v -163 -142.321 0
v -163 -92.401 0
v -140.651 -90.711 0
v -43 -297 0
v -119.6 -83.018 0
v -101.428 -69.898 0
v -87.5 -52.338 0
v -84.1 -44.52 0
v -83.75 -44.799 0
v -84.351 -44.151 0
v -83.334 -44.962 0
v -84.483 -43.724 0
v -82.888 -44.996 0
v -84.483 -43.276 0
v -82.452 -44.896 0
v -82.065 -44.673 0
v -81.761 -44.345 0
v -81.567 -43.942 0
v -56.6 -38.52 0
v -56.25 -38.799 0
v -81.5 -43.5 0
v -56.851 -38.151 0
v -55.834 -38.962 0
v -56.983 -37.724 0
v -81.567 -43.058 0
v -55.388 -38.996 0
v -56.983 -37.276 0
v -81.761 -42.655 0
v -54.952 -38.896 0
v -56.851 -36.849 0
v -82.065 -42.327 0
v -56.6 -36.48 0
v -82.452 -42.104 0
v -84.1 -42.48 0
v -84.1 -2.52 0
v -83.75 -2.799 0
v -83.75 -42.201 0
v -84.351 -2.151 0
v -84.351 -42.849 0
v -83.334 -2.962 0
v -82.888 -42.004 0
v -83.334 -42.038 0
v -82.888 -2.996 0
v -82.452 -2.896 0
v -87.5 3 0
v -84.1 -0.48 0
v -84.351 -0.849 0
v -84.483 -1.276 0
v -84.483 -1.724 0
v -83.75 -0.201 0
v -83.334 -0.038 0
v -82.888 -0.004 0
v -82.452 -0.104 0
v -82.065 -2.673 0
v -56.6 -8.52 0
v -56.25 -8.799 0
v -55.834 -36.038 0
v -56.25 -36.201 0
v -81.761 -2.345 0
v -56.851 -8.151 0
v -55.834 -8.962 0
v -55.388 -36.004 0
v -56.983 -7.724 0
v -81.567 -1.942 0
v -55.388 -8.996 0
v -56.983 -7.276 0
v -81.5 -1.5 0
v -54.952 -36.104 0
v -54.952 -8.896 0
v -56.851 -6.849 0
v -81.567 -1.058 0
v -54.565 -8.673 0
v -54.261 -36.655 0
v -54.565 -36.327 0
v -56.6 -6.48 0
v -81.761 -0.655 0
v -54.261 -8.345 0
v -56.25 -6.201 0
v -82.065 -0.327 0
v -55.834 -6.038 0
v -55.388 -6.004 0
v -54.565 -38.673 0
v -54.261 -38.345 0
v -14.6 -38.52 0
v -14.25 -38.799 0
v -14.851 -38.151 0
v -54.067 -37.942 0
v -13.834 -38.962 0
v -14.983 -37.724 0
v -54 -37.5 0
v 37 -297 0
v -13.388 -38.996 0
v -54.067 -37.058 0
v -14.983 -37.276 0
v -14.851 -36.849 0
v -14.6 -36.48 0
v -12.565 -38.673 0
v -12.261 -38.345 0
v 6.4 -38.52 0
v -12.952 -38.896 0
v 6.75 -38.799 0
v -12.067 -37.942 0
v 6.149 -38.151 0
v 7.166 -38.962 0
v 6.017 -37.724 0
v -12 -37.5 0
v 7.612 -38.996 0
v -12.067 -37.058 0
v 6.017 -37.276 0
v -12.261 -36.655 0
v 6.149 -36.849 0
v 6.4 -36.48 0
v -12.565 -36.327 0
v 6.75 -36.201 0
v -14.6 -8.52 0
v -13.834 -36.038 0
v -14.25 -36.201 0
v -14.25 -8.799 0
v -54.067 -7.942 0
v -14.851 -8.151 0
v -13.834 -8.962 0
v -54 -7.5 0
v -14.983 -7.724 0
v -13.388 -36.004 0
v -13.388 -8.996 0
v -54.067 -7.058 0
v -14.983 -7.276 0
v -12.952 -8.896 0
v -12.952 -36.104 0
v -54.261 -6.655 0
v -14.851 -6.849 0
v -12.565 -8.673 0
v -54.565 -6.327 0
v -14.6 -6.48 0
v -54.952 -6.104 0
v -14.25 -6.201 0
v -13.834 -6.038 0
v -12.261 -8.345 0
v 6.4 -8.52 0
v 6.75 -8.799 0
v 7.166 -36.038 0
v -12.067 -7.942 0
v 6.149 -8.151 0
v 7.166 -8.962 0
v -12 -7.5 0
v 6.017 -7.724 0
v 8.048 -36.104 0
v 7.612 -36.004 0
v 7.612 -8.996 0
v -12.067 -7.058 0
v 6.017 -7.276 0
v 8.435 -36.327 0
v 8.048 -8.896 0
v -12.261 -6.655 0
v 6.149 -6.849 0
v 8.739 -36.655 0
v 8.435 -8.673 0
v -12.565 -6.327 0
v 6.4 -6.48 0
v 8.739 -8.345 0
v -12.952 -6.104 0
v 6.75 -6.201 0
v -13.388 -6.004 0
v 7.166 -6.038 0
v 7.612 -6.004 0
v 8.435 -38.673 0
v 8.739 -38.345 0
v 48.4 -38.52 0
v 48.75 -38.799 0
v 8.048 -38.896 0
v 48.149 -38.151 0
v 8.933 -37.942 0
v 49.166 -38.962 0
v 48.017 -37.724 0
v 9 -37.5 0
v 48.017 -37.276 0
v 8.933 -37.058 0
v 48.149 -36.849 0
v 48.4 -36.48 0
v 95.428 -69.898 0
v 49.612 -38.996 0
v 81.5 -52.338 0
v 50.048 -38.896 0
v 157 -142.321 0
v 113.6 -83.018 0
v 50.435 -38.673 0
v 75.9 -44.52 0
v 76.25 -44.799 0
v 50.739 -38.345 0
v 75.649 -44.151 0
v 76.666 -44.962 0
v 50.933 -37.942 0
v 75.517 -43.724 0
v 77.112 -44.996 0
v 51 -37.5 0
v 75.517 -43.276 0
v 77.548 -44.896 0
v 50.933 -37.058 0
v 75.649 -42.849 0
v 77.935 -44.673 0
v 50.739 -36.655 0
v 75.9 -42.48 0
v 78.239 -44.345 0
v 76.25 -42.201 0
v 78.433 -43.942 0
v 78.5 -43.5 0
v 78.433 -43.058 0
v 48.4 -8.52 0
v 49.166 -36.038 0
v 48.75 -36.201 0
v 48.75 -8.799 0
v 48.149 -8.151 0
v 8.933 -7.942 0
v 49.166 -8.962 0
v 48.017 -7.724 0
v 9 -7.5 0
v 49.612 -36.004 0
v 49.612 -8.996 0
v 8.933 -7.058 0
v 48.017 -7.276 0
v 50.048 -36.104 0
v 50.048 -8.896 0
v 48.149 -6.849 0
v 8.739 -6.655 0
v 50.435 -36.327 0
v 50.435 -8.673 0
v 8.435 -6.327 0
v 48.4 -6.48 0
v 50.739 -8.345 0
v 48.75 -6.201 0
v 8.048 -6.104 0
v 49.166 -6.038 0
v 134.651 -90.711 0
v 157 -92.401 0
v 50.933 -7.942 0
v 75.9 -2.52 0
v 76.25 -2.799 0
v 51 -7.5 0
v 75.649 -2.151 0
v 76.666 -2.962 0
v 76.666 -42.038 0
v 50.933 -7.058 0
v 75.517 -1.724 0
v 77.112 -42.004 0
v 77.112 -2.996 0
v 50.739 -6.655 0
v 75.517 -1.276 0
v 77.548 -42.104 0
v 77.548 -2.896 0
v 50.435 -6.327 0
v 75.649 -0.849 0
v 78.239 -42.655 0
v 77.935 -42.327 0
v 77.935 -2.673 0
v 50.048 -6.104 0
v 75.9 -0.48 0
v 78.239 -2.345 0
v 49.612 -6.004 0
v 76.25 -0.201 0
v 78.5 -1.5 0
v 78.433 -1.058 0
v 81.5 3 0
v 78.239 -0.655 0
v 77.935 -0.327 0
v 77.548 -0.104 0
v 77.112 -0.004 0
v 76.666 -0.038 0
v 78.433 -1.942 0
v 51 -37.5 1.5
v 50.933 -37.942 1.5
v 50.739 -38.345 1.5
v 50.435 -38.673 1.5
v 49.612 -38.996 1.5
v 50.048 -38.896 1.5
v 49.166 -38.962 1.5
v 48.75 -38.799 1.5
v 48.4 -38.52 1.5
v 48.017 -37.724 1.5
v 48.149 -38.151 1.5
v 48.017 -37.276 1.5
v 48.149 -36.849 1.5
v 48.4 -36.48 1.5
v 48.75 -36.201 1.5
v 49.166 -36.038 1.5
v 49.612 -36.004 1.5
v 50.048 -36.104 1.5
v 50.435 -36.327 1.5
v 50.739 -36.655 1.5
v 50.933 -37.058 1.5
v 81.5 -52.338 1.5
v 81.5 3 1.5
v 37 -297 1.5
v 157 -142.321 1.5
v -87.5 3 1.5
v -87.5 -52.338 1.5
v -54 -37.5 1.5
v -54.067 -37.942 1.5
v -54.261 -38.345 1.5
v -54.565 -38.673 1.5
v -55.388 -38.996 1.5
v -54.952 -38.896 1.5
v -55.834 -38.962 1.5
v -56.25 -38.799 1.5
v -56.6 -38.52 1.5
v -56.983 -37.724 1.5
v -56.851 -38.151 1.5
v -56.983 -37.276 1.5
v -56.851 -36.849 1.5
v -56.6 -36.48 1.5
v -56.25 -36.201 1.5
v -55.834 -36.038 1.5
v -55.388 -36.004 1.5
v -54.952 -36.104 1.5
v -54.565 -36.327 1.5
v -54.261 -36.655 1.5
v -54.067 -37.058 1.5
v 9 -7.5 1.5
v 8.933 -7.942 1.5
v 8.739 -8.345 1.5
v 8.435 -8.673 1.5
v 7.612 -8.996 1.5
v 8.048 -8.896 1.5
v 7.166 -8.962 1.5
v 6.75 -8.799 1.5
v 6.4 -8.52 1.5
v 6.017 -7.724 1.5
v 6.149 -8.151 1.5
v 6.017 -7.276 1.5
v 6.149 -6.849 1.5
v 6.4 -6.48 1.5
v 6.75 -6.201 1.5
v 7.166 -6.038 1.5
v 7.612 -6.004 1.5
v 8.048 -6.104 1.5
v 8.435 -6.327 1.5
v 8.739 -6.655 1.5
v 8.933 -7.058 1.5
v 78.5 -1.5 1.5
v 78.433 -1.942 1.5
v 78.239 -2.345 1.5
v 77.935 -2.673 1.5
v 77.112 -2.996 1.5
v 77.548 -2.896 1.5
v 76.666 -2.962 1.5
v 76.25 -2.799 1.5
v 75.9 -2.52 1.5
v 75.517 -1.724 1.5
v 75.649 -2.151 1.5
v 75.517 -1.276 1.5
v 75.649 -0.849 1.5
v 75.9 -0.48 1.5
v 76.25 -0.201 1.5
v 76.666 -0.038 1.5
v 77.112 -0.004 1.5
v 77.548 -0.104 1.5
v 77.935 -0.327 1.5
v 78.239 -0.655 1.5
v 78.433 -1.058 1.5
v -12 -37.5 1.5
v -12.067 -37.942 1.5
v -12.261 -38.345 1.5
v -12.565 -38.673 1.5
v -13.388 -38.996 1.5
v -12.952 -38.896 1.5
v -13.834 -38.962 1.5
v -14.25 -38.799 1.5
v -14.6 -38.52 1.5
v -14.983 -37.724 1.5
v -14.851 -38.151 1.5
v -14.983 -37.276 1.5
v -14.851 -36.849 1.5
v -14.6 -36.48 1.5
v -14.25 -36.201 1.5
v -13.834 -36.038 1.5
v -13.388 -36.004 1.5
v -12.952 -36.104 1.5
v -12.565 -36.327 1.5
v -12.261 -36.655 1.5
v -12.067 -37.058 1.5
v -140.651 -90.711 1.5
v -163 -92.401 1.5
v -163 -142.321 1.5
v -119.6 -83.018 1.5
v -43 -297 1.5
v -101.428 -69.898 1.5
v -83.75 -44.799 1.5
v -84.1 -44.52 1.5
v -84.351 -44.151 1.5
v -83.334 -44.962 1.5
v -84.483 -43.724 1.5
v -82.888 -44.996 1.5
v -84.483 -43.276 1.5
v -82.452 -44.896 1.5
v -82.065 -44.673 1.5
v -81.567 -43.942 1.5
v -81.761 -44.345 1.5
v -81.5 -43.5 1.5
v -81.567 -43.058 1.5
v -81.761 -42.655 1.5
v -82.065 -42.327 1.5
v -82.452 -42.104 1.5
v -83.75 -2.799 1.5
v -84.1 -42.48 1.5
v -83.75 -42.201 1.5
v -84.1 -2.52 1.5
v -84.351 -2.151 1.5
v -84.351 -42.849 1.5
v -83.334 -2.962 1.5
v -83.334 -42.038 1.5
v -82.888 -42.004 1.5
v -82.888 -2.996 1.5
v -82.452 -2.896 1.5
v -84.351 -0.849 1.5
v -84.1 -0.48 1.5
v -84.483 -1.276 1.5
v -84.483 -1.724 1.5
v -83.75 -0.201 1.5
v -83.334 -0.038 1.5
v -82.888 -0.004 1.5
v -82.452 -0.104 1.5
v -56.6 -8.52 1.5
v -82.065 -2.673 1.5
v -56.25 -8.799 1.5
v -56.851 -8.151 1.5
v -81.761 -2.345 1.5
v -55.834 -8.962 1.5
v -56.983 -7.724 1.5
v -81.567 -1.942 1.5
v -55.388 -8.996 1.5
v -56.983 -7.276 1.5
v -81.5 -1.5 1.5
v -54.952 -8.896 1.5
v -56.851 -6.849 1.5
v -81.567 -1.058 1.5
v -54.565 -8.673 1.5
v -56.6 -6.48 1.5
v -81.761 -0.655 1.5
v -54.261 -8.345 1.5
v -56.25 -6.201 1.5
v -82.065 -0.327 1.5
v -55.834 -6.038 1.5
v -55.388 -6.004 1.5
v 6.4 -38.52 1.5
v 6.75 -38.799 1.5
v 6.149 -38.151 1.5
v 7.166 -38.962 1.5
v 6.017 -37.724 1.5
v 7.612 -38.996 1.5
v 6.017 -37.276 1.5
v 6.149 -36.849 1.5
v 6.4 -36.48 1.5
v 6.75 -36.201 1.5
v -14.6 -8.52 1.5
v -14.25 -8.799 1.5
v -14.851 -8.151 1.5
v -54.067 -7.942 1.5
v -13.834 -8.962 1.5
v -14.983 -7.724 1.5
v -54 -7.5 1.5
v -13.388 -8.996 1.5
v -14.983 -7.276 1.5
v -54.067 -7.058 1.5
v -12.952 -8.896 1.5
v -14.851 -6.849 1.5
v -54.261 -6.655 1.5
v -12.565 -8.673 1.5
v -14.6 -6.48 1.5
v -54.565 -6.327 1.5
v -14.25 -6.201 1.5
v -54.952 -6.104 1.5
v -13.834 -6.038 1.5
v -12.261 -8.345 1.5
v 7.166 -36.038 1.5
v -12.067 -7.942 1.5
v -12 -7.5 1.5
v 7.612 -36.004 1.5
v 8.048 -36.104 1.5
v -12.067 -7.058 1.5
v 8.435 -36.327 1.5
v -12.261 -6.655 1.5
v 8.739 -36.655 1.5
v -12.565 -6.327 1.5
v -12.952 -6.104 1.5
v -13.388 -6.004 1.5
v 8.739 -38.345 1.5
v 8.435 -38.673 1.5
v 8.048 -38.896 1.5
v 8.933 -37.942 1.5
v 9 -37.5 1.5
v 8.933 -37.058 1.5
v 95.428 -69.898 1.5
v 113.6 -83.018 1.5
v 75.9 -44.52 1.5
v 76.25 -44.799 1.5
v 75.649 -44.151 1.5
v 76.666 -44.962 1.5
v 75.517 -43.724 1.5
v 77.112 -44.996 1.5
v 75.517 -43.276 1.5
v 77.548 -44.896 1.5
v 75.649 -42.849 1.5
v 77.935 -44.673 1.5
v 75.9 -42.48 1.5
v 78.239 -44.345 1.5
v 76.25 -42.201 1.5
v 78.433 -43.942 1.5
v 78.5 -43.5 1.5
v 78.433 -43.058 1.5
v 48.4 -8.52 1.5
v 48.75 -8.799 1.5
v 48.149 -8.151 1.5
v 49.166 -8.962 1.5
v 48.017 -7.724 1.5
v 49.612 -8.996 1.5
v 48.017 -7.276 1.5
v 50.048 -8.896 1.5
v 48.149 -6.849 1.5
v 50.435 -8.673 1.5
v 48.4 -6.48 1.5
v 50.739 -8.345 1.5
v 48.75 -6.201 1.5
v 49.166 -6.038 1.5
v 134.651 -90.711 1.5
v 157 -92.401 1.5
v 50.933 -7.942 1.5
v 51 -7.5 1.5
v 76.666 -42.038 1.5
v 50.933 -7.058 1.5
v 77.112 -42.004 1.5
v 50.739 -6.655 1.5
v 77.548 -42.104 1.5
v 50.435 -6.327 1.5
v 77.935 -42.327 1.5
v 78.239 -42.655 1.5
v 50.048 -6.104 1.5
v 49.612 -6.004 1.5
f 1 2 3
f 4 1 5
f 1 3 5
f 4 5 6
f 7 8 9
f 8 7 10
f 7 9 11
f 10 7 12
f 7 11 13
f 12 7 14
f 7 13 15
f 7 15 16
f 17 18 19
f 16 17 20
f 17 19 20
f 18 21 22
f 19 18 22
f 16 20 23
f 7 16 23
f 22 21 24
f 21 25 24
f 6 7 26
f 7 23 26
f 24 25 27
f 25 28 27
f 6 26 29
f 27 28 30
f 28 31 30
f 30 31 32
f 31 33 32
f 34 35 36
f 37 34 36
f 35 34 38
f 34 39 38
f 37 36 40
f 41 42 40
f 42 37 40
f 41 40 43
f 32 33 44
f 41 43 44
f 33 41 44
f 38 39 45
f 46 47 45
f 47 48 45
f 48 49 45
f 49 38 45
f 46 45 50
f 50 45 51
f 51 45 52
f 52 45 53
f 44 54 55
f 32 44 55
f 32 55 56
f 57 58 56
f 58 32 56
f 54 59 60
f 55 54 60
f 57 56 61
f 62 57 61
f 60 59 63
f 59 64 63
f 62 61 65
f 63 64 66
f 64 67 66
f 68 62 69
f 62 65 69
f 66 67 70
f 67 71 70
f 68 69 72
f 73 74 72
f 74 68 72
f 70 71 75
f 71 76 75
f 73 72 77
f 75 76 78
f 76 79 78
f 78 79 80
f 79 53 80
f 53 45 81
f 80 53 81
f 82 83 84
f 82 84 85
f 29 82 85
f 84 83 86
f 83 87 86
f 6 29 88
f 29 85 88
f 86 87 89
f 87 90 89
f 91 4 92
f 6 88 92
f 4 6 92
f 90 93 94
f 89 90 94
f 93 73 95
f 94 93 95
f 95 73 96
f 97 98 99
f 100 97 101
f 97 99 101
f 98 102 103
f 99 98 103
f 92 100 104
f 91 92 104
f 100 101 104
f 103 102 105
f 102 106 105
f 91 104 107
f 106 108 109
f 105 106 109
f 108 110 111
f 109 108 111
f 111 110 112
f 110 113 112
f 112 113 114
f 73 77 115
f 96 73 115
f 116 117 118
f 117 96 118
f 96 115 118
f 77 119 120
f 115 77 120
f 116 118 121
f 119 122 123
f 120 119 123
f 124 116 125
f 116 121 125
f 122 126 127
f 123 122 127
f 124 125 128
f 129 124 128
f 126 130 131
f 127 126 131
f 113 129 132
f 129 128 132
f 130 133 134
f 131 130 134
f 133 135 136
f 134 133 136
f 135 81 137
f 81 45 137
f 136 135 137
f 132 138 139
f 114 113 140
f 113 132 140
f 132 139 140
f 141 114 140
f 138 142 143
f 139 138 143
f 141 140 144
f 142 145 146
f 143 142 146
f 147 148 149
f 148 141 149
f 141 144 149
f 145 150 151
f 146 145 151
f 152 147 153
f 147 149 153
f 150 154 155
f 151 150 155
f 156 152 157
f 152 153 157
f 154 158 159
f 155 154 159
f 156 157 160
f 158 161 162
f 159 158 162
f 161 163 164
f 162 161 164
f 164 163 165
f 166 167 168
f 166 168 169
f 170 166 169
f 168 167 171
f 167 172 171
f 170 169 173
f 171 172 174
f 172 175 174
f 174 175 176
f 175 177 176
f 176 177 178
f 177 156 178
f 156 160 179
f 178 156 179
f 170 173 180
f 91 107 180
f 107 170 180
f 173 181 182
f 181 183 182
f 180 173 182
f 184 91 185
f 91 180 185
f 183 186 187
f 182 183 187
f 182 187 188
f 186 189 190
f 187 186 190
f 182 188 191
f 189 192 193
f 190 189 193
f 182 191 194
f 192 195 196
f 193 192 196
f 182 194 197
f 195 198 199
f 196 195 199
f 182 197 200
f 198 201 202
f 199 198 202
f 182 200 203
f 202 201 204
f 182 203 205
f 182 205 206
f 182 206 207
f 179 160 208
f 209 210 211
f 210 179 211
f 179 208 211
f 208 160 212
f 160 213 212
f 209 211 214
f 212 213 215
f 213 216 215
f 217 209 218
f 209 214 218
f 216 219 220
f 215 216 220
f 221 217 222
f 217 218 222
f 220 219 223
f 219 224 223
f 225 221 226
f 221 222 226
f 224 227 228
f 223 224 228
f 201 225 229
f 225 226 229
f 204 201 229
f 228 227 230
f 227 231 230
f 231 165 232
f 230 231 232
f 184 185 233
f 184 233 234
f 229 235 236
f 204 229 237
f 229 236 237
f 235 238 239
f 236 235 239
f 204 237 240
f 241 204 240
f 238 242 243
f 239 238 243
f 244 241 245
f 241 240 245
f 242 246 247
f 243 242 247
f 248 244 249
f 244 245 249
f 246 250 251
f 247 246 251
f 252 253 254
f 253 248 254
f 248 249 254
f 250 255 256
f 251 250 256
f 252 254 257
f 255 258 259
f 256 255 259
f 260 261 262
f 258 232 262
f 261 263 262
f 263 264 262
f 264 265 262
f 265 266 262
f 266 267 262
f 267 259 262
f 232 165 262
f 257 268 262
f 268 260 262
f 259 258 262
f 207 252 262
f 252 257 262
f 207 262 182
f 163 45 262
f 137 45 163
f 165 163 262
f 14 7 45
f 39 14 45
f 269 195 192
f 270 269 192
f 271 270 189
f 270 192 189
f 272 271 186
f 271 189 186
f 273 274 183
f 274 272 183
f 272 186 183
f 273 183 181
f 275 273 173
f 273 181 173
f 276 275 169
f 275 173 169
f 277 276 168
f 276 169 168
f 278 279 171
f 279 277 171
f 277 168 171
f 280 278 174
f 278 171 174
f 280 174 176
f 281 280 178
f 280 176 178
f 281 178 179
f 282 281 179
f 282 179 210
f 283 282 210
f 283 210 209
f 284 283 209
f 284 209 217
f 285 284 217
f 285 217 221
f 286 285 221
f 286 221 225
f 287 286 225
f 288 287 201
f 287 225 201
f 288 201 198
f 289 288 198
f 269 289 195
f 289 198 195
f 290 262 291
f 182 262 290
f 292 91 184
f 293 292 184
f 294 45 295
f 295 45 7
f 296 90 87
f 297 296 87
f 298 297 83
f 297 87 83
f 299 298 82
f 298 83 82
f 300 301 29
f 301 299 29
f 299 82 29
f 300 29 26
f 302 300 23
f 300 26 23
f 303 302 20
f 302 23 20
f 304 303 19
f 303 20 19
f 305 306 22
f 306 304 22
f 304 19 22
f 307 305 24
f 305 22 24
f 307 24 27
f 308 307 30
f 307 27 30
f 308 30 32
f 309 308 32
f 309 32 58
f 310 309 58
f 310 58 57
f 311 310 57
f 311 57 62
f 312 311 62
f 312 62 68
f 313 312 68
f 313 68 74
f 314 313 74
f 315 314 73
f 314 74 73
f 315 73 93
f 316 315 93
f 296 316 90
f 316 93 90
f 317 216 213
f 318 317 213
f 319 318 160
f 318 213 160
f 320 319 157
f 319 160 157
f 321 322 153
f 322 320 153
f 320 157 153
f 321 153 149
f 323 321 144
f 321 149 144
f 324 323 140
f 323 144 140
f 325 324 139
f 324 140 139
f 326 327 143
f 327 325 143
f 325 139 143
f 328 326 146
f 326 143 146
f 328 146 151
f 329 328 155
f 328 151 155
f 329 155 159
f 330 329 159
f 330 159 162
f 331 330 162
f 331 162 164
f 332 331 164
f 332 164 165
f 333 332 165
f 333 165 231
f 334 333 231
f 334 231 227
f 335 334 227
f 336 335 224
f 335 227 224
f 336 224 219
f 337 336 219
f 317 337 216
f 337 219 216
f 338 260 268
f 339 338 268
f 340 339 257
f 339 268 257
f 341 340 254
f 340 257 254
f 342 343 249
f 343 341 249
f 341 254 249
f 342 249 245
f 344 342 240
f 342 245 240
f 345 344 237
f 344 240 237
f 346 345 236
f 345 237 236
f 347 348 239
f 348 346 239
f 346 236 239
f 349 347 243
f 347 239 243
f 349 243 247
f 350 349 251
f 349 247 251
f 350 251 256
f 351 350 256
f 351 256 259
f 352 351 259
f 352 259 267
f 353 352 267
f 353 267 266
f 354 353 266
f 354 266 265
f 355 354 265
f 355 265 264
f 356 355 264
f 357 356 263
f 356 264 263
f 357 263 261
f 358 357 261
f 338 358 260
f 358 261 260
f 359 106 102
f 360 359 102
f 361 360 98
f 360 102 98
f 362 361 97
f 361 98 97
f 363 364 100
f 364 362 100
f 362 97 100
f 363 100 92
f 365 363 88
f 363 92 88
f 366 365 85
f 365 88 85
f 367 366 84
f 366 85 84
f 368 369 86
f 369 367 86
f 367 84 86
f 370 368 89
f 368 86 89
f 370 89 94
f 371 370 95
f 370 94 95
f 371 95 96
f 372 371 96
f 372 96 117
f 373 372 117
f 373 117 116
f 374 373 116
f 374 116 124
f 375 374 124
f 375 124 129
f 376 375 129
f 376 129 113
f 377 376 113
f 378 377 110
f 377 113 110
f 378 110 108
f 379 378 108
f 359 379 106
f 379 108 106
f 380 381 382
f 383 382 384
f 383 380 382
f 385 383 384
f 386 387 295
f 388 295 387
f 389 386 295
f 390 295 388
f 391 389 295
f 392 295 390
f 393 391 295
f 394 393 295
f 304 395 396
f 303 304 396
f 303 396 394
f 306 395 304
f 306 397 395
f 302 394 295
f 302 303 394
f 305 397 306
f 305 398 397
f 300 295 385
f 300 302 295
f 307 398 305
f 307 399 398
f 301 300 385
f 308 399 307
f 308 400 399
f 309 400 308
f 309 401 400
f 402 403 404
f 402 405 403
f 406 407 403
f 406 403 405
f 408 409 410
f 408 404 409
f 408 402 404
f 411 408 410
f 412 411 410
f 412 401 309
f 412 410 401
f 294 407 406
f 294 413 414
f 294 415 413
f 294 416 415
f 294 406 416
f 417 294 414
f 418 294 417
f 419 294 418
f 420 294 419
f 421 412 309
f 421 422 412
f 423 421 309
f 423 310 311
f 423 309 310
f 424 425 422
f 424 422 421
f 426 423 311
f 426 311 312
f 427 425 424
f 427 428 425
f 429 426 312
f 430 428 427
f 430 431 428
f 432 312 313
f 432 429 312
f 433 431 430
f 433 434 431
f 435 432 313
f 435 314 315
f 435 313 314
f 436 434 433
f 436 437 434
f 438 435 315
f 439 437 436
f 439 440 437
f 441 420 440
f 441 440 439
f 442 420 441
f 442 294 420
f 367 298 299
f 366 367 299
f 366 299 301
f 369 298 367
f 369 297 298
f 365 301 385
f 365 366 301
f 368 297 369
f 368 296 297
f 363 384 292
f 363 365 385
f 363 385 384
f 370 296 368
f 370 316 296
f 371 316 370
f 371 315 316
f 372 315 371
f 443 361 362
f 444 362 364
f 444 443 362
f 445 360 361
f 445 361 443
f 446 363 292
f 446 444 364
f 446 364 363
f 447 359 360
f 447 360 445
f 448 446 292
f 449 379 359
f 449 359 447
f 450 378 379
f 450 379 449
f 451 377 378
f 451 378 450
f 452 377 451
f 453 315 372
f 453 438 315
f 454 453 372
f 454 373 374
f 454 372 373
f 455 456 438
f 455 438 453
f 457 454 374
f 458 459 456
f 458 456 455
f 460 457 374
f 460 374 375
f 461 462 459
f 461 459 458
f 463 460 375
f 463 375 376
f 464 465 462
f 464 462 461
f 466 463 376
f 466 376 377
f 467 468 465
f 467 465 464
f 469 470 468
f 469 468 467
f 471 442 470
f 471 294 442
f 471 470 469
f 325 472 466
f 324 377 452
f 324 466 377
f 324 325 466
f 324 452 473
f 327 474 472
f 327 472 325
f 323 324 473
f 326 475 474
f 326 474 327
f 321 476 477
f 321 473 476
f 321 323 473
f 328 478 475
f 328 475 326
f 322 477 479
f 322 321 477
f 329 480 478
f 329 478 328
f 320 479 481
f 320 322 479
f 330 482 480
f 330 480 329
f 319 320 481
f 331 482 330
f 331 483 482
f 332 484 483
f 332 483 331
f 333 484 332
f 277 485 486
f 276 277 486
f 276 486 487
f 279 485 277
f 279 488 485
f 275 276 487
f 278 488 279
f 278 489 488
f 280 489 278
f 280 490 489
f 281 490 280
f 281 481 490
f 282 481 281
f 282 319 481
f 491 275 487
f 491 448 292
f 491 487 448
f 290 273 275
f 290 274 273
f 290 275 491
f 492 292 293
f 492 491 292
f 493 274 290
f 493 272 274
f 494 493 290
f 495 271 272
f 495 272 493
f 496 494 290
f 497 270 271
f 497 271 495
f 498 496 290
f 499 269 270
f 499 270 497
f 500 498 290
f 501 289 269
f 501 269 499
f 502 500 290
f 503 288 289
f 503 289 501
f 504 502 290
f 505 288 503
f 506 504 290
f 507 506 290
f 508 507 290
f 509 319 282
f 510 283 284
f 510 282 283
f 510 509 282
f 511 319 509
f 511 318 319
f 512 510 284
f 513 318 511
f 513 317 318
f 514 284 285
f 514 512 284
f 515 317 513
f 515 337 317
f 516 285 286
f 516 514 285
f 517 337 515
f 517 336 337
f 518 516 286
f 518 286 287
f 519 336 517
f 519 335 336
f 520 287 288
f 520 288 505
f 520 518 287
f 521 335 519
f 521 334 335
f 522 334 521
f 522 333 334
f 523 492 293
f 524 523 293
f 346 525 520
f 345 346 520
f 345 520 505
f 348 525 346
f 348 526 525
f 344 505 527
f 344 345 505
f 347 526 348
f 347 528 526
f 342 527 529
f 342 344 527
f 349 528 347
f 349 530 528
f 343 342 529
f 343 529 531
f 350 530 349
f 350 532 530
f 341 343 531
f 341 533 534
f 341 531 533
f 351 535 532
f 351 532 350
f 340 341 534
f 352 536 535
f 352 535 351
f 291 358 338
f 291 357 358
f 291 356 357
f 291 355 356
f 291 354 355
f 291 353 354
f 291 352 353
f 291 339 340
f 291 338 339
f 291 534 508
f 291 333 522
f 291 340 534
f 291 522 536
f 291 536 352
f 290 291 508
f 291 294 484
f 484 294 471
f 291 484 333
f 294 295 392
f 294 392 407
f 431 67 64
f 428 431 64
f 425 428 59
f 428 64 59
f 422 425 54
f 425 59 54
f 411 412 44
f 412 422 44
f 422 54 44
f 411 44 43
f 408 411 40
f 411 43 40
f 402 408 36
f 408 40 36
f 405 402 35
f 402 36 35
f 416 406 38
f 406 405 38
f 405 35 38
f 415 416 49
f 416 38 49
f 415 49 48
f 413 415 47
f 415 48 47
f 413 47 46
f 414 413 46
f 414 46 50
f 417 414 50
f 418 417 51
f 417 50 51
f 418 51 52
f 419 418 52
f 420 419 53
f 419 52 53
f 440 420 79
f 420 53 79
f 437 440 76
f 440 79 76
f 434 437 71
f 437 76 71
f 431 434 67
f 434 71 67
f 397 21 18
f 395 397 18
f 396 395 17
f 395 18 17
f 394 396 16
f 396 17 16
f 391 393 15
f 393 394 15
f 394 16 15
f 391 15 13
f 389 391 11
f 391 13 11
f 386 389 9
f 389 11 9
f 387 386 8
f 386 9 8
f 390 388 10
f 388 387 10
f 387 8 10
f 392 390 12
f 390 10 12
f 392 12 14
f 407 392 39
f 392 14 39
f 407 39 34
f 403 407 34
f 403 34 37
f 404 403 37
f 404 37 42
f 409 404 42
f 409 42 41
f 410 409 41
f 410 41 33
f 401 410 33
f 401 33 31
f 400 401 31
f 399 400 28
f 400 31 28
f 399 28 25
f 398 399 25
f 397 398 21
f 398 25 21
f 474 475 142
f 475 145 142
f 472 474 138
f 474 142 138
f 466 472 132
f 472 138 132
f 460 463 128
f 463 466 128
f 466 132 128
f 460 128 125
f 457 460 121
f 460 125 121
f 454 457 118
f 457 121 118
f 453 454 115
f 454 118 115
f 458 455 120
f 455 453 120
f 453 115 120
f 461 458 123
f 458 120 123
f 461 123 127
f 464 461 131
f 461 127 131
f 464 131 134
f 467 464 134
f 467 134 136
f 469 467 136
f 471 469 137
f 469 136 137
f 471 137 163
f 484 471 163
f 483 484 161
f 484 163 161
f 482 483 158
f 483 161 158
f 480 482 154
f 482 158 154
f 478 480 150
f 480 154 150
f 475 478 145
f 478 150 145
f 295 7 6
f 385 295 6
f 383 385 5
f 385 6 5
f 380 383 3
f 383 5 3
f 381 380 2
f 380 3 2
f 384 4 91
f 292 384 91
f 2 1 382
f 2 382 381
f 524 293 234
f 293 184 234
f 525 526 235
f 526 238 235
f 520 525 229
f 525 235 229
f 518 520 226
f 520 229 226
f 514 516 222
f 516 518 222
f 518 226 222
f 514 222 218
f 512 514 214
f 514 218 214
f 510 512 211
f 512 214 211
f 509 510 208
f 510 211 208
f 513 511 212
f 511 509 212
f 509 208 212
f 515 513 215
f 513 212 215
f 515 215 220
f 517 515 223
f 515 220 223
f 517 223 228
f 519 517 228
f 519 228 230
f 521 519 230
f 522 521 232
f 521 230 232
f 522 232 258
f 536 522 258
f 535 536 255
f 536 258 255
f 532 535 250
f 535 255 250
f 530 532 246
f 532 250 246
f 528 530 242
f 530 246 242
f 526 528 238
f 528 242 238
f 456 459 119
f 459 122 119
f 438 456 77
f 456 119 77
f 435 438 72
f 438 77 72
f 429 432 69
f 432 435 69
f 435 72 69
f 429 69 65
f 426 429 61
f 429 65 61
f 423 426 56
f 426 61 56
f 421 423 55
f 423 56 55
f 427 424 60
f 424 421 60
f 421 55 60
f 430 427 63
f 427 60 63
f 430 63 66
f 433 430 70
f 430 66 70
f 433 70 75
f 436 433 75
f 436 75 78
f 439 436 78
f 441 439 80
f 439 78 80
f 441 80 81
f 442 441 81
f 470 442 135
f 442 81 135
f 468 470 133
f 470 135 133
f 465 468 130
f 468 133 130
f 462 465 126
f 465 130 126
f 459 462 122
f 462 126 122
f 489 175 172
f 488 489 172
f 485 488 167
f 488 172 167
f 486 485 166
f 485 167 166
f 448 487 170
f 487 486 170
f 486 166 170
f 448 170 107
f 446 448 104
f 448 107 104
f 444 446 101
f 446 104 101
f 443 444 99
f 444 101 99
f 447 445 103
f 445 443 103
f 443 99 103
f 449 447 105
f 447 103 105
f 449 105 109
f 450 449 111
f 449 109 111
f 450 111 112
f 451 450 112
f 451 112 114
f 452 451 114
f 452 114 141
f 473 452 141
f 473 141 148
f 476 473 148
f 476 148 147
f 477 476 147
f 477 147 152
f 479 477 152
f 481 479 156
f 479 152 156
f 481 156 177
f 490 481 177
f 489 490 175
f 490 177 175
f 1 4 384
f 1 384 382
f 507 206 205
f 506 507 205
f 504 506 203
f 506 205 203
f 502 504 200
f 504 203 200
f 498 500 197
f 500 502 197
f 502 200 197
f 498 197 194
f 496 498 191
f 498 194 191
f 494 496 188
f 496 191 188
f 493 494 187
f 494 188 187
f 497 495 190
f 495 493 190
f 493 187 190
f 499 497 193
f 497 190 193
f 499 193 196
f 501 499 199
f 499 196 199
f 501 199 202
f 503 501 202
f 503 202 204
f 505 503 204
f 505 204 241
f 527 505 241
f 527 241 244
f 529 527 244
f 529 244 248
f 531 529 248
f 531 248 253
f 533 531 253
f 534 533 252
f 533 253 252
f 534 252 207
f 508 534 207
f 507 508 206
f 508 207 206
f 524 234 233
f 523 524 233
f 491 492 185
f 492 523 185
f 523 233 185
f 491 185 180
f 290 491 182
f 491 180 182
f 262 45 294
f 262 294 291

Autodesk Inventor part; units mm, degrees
ref_plane "YZ Plane" through (0, 0, 0) normal (1, 0, 0) x (0, 1, 0)
ref_plane "XZ Plane" through (0, 0, 0) normal (0, 1, 0) x (-1, 0, 0)
ref_plane "XY Plane" through (0, 0, 0) normal (0, 0, 1) x (1, 0, 0)
sketch "スケッチ1" plane through (0, 0, 0) normal (0, 0, 1) x (1, 0, 0)
  line L0 (0, 0) -> (3, 0)
  line L1 (3, 0) -> (3, -15)
  line L2 (3, -15) -> (0, -15)
  line L3 (0, -15) -> (0, 0)
  line L4 (-9, 0) -> (-6, 0)
  line L5 (-6, 0) -> (-6, -15)
  line L6 (-6, -15) -> (-9, -15)
  line L7 (-9, -15) -> (-9, 0)
  line L8 (0, -30) -> (3, -30)
  line L9 (3, -30) -> (3, -45)
  line L10 (3, -45) -> (0, -45)
  line L11 (0, -45) -> (0, -30)
  line L12 (-9, -30) -> (-6, -30)
  line L13 (-6, -30) -> (-6, -45)
  line L14 (-6, -45) -> (-9, -45)
  line L15 (-9, -45) -> (-9, -30)
  line L16 (-87.5, 3) -> (81.5, 3)
  line L17 (-87.5, 3) -> (-87.5, -48)
  line L18 (-87.5, -48) -> (81.5, -48)
  line L19 (81.5, -48) -> (81.5, 3)
  circle A0 centre (-83, -1.5) radius 1.5
  circle A1 centre (77, -1.5) radius 1.5
  circle A2 centre (77, -43.5) radius 1.5
  circle A3 centre (-83, -43.5) radius 1.5
  circle A4 centre (3, -1.05) radius 1.05
  circle A5 centre (3, -13.95) radius 1.05
  circle A6 centre (0, -13.95) radius 1.05
  circle A7 centre (0, -1.05) radius 1.05
  circle A8 centre (-6, -1.05) radius 1.05
  circle A9 centre (-6, -13.95) radius 1.05
  circle A10 centre (-9, -13.95) radius 1.05
  circle A11 centre (-9, -1.05) radius 1.05
  circle A12 centre (-6, -31.05) radius 1.05
  circle A13 centre (-6, -43.95) radius 1.05
  circle A14 centre (-9, -43.95) radius 1.05
  circle A15 centre (-9, -31.05) radius 1.05
  circle A16 centre (0, -31.05) radius 1.05
  circle A17 centre (3, -31.05) radius 1.05
  circle A18 centre (3, -43.95) radius 1.05
  circle A19 centre (0, -43.95) radius 1.05
  circle A20 centre (-13.5, -7.5) radius 1.5
  circle A21 centre (7.5, -7.5) radius 1.5
  circle A22 centre (7.5, -37.5) radius 1.5
  circle A23 centre (-13.5, -37.5) radius 1.5
  line L20 (45, -30) -> (45, -45)
  line L21 (45, -45) -> (42, -45)
  circle A24 centre (42, -43.95) radius 1.05
  line L22 (42, -45) -> (42, -30)
  circle A25 centre (45, -43.95) radius 1.05
  line L23 (42, 0) -> (45, 0)
  line L24 (45, 0) -> (45, -15)
  line L25 (45, -15) -> (42, -15)
  line L26 (42, -15) -> (42, 0)
  circle A26 centre (45, -1.05) radius 1.05
  circle A27 centre (42, -1.05) radius 1.05
  circle A28 centre (42, -13.95) radius 1.05
  circle A29 centre (45, -13.95) radius 1.05
  line L27 (42, -30) -> (45, -30)
  circle A30 centre (45, -31.05) radius 1.05
  circle A31 centre (42, -31.05) radius 1.05
  circle A32 centre (49.5, -37.5) radius 1.5
  circle A33 centre (49.5, -7.5) radius 1.5
  line L28 (-51, -15) -> (-51, 0)
  line L29 (-48, -30) -> (-48, -45)
  line L30 (-51, -45) -> (-51, -30)
  line L31 (-48, 0) -> (-48, -15)
  circle A34 centre (-48, -31.05) radius 1.05
  circle A35 centre (-48, -43.95) radius 1.05
  circle A36 centre (-51, -13.95) radius 1.05
  circle A37 centre (-55.5, -7.5) radius 1.5
  circle A38 centre (-48, -1.05) radius 1.05
  circle A39 centre (-51, -1.05) radius 1.05
  circle A40 centre (-48, -13.95) radius 1.05
  line L32 (-48, -45) -> (-51, -45)
  line L33 (-51, -30) -> (-48, -30)
  line L34 (-51, 0) -> (-48, 0)
  line L35 (-48, -15) -> (-51, -15)
  circle A41 centre (-51, -43.95) radius 1.05
  circle A42 centre (-51, -31.05) radius 1.05
  circle A43 centre (-55.5, -37.5) radius 1.5
  point P0 (0, -42.9)
  point P1 (0, -32.1)
  point P2 (3, -32.1)
  point P3 (3, -42.9)
  point P4 (0, -2.1)
  point P5 (3, -2.1)
  point P6 (3, -12.9)
  point P7 (0, -12.9)
  point P8 (-9, -2.1)
  point P9 (-6, 0)
  point P10 (-6, -2.1)
  point P11 (-6, -12.9)
  point P12 (-9, -12.9)
  point P13 (-9, -32.1)
  point P14 (-6, -32.1)
  point P15 (-6, -42.9)
  point P16 (-9, -42.9)
  point P17 (-4.9275, 0)
  point P18 (1, -30)
  point P19 (-51, -32.1)
  point P20 (-48, -32.1)
  point P21 (-48, -42.9)
  point P22 (-51, -42.9)
  point P23 (42, -12.9)
  point P24 (42, -2.1)
  point P25 (45, -2.1)
  point P26 (45, -12.9)
  point P27 (42, -32.1)
  point P28 (45, -32.1)
  point P29 (45, -42.9)
  point P30 (42, -42.9)
  point P31 (-51, -12.9)
  point P32 (-51, -2.1)
  point P33 (-51, 0)
  point P34 (-48, -2.1)
  point P35 (-48, -12.9)
  dimension "d0" = 3
  dimension "d1" = 15
  dimension "d2" = 3
  dimension "d3" = 15
  dimension "d4" = 3
  dimension "d5" = 15
  dimension "d6" = 3
  dimension "d7" = 15
  dimension "d8" = 15
  dimension "d9" = 6
  dimension "d10" = 3
  dimension "d11" = 3
  dimension "d12" = 3
  dimension "d13" = 3
  dimension "d14" = 3
  dimension "d15" = 3
  dimension "d16" = 4.5
  dimension "d17" = 4.5
  dimension "d18" = 4.5
  dimension "d19" = 4.5
  dimension "d20" = 4.5
  dimension "d21" = 4.5
  dimension "d22" = 4.5
  dimension "d23" = 4.5
  dimension "d24" = 160
  dimension "d25" = 74
  dimension "d26" = 2.1
  dimension "d27" = 3
  dimension "d28" = 3
  dimension "d29" = 3
  dimension "d30" = 3
  dimension "d31" = 4.5
  dimension "d32" = 4.5
  dimension "d33" = 4.5
  dimension "d34" = 4.5
  dimension "d35" = 7.5
  dimension "d36" = 7.5
  dimension "d37" = 7.5
  dimension "d38" = 7.5
  dimension "d39" = 3
  dimension "d40" = 15
  dimension "d41" = 3
  dimension "d42" = 15
  dimension "d43" = 15
  dimension "d44" = 2.1
  dimension "d45" = 3
  dimension "d46" = 3
  dimension "d47" = 4.5
  dimension "d48" = 4.5
  dimension "d49" = 7.5
  dimension "d50" = 7.5
  dimension "d51" = 3
  dimension "d52" = 15
  dimension "d53" = 3
  dimension "d54" = 15
  dimension "d55" = 3
  dimension "d56" = 3
  dimension "d57" = 4.5
  dimension "d58" = 4.5
  dimension "d59" = 7.5
  dimension "d60" = 7.5
  dimension "d61" = 3
  dimension "d62" = 90
  dimension "d63" = 36.5
sketch "スケッチ2" plane through (0, 0, 0) normal (0, 0, 1) x (1, 0, 0)
  circle A0 centre (-83, -1.5) radius 1.5 projected
  circle A1 centre (-83, -43.5) radius 1.5 projected
  circle A2 centre (-55.5, -7.5) radius 1.5 projected
  circle A3 centre (-55.5, -37.5) radius 1.5 projected
  circle A4 centre (-13.5, -37.5) radius 1.5 projected
  circle A5 centre (-13.5, -7.5) radius 1.5 projected
  circle A6 centre (7.5, -7.5) radius 1.5 projected
  circle A7 centre (7.5, -37.5) radius 1.5 projected
  circle A8 centre (49.5, -37.5) radius 1.5 projected
  circle A9 centre (49.5, -7.5) radius 1.5 projected
  circle A10 centre (77, -1.5) radius 1.5 projected
  circle A11 centre (77, -43.5) radius 1.5 projected
  line L0 (-87.5, 3) -> (81.5, 3) projected
  line L1 (-87.5, 3) -> (-87.5, -52.3382)
  line L2 (81.5, 3) -> (81.5, -52.3382)
  line L3 (-43, -297) -> (37, -297)
  line L4 (-43, -297) -> (-163, -142.321)
  line L5 (37, -297) -> (157, -142.321)
  line L6 (157, -142.321) -> (157, -92.4008)
  line L7 (-163, -142.321) -> (-163, -92.4008)
  arc A12 (-163, -92.4008) -> (-87.5, -52.3382) centre (-157.9321, -10.7785) ccw
  arc A13 (81.5, -52.3382) -> (157, -92.4008) centre (151.9321, -10.7785) ccw
  point P0 (0, 0)
  dimension "d66" = 80
  dimension "d67" = 300
  dimension "d68" = 44.5
  dimension "d69" = 44.5
  dimension "d70" = 320
  dimension "d71" = 75.5
  dimension "d72" = 75.5
extrude "押し出し1" add sketch "スケッチ2" along normal blind 1.5
sketch "スケッチ3" plane through (0, 0, 1.5) normal (0, 0, 1) x (1, 0, 0)
  arc A0 (81.5, -62.77) -> (157, -104.1946) centre (152.6935, -22.5286) ccw projected
  line L0 (81.5, -62.77) -> (81.5, 3) projected
  line L1 (81.5, 3) -> (-87.5, 3) projected
  line L2 (-87.5, 3) -> (-87.5, -62.77) projected
  arc A1 (-163, -104.1946) -> (-87.5, -62.77) centre (-158.6935, -22.5286) ccw projected
  line L3 (-163, -104.1946) -> (-163, -142.321) projected
  line L4 (-163, -142.321) -> (-43, -297) projected
  line L5 (-43, -297) -> (37, -297) projected
  line L6 (37, -297) -> (157, -142.321) projected
  line L7 (157, -142.321) -> (157, -104.1946) projected
  circle A2 centre (77, -43.5) radius 1.5 projected
  circle A3 centre (49.5, -7.5) radius 1.5 projected
  circle A4 centre (7.5, -37.5) radius 1.5 projected
  circle A5 centre (7.5, -7.5) radius 1.5 projected
  circle A6 centre (-13.5, -7.5) radius 1.5 projected
  circle A7 centre (-13.5, -37.5) radius 1.5 projected
  circle A8 centre (-55.5, -37.5) radius 1.5 projected
  circle A9 centre (-55.5, -7.5) radius 1.5 projected
  circle A10 centre (-83, -43.5) radius 1.5 projected
  circle A11 centre (-83, -1.5) radius 1.5 projected
  circle A12 centre (49.5, -37.5) radius 1.5 projected
  circle A13 centre (77, -1.5) radius 1.5 projected
  line L8 (81.5, 3) -> (-87.5, 3) projected
  line L9 (-87.5, 3) -> (-57.4301, 94.7393)
  line L10 (-57.4301, 94.7393) -> (-30.5041, 94.7393)
  line L11 (-30.5041, 94.7393) -> (-30.5041, 42.9458)
  line L12 (-30.5041, 42.9458) -> (24.5041, 42.9458)
  line L13 (24.5041, 42.9458) -> (24.5041, 94.7393)
  line L14 (24.5041, 94.7393) -> (51.4301, 94.7393)
  line L15 (51.4301, 94.7393) -> (81.5, 3)
  point P0 (0, 0)
  dimension "d75" = 56.9959
  dimension "d76" = 56.9959
equation "\"d69\" = d68"
equation "\"d72\" = d71"
equation "\"d76\" = d75"
properties part number "シールド" material "ポリカーボネート、クリア"
